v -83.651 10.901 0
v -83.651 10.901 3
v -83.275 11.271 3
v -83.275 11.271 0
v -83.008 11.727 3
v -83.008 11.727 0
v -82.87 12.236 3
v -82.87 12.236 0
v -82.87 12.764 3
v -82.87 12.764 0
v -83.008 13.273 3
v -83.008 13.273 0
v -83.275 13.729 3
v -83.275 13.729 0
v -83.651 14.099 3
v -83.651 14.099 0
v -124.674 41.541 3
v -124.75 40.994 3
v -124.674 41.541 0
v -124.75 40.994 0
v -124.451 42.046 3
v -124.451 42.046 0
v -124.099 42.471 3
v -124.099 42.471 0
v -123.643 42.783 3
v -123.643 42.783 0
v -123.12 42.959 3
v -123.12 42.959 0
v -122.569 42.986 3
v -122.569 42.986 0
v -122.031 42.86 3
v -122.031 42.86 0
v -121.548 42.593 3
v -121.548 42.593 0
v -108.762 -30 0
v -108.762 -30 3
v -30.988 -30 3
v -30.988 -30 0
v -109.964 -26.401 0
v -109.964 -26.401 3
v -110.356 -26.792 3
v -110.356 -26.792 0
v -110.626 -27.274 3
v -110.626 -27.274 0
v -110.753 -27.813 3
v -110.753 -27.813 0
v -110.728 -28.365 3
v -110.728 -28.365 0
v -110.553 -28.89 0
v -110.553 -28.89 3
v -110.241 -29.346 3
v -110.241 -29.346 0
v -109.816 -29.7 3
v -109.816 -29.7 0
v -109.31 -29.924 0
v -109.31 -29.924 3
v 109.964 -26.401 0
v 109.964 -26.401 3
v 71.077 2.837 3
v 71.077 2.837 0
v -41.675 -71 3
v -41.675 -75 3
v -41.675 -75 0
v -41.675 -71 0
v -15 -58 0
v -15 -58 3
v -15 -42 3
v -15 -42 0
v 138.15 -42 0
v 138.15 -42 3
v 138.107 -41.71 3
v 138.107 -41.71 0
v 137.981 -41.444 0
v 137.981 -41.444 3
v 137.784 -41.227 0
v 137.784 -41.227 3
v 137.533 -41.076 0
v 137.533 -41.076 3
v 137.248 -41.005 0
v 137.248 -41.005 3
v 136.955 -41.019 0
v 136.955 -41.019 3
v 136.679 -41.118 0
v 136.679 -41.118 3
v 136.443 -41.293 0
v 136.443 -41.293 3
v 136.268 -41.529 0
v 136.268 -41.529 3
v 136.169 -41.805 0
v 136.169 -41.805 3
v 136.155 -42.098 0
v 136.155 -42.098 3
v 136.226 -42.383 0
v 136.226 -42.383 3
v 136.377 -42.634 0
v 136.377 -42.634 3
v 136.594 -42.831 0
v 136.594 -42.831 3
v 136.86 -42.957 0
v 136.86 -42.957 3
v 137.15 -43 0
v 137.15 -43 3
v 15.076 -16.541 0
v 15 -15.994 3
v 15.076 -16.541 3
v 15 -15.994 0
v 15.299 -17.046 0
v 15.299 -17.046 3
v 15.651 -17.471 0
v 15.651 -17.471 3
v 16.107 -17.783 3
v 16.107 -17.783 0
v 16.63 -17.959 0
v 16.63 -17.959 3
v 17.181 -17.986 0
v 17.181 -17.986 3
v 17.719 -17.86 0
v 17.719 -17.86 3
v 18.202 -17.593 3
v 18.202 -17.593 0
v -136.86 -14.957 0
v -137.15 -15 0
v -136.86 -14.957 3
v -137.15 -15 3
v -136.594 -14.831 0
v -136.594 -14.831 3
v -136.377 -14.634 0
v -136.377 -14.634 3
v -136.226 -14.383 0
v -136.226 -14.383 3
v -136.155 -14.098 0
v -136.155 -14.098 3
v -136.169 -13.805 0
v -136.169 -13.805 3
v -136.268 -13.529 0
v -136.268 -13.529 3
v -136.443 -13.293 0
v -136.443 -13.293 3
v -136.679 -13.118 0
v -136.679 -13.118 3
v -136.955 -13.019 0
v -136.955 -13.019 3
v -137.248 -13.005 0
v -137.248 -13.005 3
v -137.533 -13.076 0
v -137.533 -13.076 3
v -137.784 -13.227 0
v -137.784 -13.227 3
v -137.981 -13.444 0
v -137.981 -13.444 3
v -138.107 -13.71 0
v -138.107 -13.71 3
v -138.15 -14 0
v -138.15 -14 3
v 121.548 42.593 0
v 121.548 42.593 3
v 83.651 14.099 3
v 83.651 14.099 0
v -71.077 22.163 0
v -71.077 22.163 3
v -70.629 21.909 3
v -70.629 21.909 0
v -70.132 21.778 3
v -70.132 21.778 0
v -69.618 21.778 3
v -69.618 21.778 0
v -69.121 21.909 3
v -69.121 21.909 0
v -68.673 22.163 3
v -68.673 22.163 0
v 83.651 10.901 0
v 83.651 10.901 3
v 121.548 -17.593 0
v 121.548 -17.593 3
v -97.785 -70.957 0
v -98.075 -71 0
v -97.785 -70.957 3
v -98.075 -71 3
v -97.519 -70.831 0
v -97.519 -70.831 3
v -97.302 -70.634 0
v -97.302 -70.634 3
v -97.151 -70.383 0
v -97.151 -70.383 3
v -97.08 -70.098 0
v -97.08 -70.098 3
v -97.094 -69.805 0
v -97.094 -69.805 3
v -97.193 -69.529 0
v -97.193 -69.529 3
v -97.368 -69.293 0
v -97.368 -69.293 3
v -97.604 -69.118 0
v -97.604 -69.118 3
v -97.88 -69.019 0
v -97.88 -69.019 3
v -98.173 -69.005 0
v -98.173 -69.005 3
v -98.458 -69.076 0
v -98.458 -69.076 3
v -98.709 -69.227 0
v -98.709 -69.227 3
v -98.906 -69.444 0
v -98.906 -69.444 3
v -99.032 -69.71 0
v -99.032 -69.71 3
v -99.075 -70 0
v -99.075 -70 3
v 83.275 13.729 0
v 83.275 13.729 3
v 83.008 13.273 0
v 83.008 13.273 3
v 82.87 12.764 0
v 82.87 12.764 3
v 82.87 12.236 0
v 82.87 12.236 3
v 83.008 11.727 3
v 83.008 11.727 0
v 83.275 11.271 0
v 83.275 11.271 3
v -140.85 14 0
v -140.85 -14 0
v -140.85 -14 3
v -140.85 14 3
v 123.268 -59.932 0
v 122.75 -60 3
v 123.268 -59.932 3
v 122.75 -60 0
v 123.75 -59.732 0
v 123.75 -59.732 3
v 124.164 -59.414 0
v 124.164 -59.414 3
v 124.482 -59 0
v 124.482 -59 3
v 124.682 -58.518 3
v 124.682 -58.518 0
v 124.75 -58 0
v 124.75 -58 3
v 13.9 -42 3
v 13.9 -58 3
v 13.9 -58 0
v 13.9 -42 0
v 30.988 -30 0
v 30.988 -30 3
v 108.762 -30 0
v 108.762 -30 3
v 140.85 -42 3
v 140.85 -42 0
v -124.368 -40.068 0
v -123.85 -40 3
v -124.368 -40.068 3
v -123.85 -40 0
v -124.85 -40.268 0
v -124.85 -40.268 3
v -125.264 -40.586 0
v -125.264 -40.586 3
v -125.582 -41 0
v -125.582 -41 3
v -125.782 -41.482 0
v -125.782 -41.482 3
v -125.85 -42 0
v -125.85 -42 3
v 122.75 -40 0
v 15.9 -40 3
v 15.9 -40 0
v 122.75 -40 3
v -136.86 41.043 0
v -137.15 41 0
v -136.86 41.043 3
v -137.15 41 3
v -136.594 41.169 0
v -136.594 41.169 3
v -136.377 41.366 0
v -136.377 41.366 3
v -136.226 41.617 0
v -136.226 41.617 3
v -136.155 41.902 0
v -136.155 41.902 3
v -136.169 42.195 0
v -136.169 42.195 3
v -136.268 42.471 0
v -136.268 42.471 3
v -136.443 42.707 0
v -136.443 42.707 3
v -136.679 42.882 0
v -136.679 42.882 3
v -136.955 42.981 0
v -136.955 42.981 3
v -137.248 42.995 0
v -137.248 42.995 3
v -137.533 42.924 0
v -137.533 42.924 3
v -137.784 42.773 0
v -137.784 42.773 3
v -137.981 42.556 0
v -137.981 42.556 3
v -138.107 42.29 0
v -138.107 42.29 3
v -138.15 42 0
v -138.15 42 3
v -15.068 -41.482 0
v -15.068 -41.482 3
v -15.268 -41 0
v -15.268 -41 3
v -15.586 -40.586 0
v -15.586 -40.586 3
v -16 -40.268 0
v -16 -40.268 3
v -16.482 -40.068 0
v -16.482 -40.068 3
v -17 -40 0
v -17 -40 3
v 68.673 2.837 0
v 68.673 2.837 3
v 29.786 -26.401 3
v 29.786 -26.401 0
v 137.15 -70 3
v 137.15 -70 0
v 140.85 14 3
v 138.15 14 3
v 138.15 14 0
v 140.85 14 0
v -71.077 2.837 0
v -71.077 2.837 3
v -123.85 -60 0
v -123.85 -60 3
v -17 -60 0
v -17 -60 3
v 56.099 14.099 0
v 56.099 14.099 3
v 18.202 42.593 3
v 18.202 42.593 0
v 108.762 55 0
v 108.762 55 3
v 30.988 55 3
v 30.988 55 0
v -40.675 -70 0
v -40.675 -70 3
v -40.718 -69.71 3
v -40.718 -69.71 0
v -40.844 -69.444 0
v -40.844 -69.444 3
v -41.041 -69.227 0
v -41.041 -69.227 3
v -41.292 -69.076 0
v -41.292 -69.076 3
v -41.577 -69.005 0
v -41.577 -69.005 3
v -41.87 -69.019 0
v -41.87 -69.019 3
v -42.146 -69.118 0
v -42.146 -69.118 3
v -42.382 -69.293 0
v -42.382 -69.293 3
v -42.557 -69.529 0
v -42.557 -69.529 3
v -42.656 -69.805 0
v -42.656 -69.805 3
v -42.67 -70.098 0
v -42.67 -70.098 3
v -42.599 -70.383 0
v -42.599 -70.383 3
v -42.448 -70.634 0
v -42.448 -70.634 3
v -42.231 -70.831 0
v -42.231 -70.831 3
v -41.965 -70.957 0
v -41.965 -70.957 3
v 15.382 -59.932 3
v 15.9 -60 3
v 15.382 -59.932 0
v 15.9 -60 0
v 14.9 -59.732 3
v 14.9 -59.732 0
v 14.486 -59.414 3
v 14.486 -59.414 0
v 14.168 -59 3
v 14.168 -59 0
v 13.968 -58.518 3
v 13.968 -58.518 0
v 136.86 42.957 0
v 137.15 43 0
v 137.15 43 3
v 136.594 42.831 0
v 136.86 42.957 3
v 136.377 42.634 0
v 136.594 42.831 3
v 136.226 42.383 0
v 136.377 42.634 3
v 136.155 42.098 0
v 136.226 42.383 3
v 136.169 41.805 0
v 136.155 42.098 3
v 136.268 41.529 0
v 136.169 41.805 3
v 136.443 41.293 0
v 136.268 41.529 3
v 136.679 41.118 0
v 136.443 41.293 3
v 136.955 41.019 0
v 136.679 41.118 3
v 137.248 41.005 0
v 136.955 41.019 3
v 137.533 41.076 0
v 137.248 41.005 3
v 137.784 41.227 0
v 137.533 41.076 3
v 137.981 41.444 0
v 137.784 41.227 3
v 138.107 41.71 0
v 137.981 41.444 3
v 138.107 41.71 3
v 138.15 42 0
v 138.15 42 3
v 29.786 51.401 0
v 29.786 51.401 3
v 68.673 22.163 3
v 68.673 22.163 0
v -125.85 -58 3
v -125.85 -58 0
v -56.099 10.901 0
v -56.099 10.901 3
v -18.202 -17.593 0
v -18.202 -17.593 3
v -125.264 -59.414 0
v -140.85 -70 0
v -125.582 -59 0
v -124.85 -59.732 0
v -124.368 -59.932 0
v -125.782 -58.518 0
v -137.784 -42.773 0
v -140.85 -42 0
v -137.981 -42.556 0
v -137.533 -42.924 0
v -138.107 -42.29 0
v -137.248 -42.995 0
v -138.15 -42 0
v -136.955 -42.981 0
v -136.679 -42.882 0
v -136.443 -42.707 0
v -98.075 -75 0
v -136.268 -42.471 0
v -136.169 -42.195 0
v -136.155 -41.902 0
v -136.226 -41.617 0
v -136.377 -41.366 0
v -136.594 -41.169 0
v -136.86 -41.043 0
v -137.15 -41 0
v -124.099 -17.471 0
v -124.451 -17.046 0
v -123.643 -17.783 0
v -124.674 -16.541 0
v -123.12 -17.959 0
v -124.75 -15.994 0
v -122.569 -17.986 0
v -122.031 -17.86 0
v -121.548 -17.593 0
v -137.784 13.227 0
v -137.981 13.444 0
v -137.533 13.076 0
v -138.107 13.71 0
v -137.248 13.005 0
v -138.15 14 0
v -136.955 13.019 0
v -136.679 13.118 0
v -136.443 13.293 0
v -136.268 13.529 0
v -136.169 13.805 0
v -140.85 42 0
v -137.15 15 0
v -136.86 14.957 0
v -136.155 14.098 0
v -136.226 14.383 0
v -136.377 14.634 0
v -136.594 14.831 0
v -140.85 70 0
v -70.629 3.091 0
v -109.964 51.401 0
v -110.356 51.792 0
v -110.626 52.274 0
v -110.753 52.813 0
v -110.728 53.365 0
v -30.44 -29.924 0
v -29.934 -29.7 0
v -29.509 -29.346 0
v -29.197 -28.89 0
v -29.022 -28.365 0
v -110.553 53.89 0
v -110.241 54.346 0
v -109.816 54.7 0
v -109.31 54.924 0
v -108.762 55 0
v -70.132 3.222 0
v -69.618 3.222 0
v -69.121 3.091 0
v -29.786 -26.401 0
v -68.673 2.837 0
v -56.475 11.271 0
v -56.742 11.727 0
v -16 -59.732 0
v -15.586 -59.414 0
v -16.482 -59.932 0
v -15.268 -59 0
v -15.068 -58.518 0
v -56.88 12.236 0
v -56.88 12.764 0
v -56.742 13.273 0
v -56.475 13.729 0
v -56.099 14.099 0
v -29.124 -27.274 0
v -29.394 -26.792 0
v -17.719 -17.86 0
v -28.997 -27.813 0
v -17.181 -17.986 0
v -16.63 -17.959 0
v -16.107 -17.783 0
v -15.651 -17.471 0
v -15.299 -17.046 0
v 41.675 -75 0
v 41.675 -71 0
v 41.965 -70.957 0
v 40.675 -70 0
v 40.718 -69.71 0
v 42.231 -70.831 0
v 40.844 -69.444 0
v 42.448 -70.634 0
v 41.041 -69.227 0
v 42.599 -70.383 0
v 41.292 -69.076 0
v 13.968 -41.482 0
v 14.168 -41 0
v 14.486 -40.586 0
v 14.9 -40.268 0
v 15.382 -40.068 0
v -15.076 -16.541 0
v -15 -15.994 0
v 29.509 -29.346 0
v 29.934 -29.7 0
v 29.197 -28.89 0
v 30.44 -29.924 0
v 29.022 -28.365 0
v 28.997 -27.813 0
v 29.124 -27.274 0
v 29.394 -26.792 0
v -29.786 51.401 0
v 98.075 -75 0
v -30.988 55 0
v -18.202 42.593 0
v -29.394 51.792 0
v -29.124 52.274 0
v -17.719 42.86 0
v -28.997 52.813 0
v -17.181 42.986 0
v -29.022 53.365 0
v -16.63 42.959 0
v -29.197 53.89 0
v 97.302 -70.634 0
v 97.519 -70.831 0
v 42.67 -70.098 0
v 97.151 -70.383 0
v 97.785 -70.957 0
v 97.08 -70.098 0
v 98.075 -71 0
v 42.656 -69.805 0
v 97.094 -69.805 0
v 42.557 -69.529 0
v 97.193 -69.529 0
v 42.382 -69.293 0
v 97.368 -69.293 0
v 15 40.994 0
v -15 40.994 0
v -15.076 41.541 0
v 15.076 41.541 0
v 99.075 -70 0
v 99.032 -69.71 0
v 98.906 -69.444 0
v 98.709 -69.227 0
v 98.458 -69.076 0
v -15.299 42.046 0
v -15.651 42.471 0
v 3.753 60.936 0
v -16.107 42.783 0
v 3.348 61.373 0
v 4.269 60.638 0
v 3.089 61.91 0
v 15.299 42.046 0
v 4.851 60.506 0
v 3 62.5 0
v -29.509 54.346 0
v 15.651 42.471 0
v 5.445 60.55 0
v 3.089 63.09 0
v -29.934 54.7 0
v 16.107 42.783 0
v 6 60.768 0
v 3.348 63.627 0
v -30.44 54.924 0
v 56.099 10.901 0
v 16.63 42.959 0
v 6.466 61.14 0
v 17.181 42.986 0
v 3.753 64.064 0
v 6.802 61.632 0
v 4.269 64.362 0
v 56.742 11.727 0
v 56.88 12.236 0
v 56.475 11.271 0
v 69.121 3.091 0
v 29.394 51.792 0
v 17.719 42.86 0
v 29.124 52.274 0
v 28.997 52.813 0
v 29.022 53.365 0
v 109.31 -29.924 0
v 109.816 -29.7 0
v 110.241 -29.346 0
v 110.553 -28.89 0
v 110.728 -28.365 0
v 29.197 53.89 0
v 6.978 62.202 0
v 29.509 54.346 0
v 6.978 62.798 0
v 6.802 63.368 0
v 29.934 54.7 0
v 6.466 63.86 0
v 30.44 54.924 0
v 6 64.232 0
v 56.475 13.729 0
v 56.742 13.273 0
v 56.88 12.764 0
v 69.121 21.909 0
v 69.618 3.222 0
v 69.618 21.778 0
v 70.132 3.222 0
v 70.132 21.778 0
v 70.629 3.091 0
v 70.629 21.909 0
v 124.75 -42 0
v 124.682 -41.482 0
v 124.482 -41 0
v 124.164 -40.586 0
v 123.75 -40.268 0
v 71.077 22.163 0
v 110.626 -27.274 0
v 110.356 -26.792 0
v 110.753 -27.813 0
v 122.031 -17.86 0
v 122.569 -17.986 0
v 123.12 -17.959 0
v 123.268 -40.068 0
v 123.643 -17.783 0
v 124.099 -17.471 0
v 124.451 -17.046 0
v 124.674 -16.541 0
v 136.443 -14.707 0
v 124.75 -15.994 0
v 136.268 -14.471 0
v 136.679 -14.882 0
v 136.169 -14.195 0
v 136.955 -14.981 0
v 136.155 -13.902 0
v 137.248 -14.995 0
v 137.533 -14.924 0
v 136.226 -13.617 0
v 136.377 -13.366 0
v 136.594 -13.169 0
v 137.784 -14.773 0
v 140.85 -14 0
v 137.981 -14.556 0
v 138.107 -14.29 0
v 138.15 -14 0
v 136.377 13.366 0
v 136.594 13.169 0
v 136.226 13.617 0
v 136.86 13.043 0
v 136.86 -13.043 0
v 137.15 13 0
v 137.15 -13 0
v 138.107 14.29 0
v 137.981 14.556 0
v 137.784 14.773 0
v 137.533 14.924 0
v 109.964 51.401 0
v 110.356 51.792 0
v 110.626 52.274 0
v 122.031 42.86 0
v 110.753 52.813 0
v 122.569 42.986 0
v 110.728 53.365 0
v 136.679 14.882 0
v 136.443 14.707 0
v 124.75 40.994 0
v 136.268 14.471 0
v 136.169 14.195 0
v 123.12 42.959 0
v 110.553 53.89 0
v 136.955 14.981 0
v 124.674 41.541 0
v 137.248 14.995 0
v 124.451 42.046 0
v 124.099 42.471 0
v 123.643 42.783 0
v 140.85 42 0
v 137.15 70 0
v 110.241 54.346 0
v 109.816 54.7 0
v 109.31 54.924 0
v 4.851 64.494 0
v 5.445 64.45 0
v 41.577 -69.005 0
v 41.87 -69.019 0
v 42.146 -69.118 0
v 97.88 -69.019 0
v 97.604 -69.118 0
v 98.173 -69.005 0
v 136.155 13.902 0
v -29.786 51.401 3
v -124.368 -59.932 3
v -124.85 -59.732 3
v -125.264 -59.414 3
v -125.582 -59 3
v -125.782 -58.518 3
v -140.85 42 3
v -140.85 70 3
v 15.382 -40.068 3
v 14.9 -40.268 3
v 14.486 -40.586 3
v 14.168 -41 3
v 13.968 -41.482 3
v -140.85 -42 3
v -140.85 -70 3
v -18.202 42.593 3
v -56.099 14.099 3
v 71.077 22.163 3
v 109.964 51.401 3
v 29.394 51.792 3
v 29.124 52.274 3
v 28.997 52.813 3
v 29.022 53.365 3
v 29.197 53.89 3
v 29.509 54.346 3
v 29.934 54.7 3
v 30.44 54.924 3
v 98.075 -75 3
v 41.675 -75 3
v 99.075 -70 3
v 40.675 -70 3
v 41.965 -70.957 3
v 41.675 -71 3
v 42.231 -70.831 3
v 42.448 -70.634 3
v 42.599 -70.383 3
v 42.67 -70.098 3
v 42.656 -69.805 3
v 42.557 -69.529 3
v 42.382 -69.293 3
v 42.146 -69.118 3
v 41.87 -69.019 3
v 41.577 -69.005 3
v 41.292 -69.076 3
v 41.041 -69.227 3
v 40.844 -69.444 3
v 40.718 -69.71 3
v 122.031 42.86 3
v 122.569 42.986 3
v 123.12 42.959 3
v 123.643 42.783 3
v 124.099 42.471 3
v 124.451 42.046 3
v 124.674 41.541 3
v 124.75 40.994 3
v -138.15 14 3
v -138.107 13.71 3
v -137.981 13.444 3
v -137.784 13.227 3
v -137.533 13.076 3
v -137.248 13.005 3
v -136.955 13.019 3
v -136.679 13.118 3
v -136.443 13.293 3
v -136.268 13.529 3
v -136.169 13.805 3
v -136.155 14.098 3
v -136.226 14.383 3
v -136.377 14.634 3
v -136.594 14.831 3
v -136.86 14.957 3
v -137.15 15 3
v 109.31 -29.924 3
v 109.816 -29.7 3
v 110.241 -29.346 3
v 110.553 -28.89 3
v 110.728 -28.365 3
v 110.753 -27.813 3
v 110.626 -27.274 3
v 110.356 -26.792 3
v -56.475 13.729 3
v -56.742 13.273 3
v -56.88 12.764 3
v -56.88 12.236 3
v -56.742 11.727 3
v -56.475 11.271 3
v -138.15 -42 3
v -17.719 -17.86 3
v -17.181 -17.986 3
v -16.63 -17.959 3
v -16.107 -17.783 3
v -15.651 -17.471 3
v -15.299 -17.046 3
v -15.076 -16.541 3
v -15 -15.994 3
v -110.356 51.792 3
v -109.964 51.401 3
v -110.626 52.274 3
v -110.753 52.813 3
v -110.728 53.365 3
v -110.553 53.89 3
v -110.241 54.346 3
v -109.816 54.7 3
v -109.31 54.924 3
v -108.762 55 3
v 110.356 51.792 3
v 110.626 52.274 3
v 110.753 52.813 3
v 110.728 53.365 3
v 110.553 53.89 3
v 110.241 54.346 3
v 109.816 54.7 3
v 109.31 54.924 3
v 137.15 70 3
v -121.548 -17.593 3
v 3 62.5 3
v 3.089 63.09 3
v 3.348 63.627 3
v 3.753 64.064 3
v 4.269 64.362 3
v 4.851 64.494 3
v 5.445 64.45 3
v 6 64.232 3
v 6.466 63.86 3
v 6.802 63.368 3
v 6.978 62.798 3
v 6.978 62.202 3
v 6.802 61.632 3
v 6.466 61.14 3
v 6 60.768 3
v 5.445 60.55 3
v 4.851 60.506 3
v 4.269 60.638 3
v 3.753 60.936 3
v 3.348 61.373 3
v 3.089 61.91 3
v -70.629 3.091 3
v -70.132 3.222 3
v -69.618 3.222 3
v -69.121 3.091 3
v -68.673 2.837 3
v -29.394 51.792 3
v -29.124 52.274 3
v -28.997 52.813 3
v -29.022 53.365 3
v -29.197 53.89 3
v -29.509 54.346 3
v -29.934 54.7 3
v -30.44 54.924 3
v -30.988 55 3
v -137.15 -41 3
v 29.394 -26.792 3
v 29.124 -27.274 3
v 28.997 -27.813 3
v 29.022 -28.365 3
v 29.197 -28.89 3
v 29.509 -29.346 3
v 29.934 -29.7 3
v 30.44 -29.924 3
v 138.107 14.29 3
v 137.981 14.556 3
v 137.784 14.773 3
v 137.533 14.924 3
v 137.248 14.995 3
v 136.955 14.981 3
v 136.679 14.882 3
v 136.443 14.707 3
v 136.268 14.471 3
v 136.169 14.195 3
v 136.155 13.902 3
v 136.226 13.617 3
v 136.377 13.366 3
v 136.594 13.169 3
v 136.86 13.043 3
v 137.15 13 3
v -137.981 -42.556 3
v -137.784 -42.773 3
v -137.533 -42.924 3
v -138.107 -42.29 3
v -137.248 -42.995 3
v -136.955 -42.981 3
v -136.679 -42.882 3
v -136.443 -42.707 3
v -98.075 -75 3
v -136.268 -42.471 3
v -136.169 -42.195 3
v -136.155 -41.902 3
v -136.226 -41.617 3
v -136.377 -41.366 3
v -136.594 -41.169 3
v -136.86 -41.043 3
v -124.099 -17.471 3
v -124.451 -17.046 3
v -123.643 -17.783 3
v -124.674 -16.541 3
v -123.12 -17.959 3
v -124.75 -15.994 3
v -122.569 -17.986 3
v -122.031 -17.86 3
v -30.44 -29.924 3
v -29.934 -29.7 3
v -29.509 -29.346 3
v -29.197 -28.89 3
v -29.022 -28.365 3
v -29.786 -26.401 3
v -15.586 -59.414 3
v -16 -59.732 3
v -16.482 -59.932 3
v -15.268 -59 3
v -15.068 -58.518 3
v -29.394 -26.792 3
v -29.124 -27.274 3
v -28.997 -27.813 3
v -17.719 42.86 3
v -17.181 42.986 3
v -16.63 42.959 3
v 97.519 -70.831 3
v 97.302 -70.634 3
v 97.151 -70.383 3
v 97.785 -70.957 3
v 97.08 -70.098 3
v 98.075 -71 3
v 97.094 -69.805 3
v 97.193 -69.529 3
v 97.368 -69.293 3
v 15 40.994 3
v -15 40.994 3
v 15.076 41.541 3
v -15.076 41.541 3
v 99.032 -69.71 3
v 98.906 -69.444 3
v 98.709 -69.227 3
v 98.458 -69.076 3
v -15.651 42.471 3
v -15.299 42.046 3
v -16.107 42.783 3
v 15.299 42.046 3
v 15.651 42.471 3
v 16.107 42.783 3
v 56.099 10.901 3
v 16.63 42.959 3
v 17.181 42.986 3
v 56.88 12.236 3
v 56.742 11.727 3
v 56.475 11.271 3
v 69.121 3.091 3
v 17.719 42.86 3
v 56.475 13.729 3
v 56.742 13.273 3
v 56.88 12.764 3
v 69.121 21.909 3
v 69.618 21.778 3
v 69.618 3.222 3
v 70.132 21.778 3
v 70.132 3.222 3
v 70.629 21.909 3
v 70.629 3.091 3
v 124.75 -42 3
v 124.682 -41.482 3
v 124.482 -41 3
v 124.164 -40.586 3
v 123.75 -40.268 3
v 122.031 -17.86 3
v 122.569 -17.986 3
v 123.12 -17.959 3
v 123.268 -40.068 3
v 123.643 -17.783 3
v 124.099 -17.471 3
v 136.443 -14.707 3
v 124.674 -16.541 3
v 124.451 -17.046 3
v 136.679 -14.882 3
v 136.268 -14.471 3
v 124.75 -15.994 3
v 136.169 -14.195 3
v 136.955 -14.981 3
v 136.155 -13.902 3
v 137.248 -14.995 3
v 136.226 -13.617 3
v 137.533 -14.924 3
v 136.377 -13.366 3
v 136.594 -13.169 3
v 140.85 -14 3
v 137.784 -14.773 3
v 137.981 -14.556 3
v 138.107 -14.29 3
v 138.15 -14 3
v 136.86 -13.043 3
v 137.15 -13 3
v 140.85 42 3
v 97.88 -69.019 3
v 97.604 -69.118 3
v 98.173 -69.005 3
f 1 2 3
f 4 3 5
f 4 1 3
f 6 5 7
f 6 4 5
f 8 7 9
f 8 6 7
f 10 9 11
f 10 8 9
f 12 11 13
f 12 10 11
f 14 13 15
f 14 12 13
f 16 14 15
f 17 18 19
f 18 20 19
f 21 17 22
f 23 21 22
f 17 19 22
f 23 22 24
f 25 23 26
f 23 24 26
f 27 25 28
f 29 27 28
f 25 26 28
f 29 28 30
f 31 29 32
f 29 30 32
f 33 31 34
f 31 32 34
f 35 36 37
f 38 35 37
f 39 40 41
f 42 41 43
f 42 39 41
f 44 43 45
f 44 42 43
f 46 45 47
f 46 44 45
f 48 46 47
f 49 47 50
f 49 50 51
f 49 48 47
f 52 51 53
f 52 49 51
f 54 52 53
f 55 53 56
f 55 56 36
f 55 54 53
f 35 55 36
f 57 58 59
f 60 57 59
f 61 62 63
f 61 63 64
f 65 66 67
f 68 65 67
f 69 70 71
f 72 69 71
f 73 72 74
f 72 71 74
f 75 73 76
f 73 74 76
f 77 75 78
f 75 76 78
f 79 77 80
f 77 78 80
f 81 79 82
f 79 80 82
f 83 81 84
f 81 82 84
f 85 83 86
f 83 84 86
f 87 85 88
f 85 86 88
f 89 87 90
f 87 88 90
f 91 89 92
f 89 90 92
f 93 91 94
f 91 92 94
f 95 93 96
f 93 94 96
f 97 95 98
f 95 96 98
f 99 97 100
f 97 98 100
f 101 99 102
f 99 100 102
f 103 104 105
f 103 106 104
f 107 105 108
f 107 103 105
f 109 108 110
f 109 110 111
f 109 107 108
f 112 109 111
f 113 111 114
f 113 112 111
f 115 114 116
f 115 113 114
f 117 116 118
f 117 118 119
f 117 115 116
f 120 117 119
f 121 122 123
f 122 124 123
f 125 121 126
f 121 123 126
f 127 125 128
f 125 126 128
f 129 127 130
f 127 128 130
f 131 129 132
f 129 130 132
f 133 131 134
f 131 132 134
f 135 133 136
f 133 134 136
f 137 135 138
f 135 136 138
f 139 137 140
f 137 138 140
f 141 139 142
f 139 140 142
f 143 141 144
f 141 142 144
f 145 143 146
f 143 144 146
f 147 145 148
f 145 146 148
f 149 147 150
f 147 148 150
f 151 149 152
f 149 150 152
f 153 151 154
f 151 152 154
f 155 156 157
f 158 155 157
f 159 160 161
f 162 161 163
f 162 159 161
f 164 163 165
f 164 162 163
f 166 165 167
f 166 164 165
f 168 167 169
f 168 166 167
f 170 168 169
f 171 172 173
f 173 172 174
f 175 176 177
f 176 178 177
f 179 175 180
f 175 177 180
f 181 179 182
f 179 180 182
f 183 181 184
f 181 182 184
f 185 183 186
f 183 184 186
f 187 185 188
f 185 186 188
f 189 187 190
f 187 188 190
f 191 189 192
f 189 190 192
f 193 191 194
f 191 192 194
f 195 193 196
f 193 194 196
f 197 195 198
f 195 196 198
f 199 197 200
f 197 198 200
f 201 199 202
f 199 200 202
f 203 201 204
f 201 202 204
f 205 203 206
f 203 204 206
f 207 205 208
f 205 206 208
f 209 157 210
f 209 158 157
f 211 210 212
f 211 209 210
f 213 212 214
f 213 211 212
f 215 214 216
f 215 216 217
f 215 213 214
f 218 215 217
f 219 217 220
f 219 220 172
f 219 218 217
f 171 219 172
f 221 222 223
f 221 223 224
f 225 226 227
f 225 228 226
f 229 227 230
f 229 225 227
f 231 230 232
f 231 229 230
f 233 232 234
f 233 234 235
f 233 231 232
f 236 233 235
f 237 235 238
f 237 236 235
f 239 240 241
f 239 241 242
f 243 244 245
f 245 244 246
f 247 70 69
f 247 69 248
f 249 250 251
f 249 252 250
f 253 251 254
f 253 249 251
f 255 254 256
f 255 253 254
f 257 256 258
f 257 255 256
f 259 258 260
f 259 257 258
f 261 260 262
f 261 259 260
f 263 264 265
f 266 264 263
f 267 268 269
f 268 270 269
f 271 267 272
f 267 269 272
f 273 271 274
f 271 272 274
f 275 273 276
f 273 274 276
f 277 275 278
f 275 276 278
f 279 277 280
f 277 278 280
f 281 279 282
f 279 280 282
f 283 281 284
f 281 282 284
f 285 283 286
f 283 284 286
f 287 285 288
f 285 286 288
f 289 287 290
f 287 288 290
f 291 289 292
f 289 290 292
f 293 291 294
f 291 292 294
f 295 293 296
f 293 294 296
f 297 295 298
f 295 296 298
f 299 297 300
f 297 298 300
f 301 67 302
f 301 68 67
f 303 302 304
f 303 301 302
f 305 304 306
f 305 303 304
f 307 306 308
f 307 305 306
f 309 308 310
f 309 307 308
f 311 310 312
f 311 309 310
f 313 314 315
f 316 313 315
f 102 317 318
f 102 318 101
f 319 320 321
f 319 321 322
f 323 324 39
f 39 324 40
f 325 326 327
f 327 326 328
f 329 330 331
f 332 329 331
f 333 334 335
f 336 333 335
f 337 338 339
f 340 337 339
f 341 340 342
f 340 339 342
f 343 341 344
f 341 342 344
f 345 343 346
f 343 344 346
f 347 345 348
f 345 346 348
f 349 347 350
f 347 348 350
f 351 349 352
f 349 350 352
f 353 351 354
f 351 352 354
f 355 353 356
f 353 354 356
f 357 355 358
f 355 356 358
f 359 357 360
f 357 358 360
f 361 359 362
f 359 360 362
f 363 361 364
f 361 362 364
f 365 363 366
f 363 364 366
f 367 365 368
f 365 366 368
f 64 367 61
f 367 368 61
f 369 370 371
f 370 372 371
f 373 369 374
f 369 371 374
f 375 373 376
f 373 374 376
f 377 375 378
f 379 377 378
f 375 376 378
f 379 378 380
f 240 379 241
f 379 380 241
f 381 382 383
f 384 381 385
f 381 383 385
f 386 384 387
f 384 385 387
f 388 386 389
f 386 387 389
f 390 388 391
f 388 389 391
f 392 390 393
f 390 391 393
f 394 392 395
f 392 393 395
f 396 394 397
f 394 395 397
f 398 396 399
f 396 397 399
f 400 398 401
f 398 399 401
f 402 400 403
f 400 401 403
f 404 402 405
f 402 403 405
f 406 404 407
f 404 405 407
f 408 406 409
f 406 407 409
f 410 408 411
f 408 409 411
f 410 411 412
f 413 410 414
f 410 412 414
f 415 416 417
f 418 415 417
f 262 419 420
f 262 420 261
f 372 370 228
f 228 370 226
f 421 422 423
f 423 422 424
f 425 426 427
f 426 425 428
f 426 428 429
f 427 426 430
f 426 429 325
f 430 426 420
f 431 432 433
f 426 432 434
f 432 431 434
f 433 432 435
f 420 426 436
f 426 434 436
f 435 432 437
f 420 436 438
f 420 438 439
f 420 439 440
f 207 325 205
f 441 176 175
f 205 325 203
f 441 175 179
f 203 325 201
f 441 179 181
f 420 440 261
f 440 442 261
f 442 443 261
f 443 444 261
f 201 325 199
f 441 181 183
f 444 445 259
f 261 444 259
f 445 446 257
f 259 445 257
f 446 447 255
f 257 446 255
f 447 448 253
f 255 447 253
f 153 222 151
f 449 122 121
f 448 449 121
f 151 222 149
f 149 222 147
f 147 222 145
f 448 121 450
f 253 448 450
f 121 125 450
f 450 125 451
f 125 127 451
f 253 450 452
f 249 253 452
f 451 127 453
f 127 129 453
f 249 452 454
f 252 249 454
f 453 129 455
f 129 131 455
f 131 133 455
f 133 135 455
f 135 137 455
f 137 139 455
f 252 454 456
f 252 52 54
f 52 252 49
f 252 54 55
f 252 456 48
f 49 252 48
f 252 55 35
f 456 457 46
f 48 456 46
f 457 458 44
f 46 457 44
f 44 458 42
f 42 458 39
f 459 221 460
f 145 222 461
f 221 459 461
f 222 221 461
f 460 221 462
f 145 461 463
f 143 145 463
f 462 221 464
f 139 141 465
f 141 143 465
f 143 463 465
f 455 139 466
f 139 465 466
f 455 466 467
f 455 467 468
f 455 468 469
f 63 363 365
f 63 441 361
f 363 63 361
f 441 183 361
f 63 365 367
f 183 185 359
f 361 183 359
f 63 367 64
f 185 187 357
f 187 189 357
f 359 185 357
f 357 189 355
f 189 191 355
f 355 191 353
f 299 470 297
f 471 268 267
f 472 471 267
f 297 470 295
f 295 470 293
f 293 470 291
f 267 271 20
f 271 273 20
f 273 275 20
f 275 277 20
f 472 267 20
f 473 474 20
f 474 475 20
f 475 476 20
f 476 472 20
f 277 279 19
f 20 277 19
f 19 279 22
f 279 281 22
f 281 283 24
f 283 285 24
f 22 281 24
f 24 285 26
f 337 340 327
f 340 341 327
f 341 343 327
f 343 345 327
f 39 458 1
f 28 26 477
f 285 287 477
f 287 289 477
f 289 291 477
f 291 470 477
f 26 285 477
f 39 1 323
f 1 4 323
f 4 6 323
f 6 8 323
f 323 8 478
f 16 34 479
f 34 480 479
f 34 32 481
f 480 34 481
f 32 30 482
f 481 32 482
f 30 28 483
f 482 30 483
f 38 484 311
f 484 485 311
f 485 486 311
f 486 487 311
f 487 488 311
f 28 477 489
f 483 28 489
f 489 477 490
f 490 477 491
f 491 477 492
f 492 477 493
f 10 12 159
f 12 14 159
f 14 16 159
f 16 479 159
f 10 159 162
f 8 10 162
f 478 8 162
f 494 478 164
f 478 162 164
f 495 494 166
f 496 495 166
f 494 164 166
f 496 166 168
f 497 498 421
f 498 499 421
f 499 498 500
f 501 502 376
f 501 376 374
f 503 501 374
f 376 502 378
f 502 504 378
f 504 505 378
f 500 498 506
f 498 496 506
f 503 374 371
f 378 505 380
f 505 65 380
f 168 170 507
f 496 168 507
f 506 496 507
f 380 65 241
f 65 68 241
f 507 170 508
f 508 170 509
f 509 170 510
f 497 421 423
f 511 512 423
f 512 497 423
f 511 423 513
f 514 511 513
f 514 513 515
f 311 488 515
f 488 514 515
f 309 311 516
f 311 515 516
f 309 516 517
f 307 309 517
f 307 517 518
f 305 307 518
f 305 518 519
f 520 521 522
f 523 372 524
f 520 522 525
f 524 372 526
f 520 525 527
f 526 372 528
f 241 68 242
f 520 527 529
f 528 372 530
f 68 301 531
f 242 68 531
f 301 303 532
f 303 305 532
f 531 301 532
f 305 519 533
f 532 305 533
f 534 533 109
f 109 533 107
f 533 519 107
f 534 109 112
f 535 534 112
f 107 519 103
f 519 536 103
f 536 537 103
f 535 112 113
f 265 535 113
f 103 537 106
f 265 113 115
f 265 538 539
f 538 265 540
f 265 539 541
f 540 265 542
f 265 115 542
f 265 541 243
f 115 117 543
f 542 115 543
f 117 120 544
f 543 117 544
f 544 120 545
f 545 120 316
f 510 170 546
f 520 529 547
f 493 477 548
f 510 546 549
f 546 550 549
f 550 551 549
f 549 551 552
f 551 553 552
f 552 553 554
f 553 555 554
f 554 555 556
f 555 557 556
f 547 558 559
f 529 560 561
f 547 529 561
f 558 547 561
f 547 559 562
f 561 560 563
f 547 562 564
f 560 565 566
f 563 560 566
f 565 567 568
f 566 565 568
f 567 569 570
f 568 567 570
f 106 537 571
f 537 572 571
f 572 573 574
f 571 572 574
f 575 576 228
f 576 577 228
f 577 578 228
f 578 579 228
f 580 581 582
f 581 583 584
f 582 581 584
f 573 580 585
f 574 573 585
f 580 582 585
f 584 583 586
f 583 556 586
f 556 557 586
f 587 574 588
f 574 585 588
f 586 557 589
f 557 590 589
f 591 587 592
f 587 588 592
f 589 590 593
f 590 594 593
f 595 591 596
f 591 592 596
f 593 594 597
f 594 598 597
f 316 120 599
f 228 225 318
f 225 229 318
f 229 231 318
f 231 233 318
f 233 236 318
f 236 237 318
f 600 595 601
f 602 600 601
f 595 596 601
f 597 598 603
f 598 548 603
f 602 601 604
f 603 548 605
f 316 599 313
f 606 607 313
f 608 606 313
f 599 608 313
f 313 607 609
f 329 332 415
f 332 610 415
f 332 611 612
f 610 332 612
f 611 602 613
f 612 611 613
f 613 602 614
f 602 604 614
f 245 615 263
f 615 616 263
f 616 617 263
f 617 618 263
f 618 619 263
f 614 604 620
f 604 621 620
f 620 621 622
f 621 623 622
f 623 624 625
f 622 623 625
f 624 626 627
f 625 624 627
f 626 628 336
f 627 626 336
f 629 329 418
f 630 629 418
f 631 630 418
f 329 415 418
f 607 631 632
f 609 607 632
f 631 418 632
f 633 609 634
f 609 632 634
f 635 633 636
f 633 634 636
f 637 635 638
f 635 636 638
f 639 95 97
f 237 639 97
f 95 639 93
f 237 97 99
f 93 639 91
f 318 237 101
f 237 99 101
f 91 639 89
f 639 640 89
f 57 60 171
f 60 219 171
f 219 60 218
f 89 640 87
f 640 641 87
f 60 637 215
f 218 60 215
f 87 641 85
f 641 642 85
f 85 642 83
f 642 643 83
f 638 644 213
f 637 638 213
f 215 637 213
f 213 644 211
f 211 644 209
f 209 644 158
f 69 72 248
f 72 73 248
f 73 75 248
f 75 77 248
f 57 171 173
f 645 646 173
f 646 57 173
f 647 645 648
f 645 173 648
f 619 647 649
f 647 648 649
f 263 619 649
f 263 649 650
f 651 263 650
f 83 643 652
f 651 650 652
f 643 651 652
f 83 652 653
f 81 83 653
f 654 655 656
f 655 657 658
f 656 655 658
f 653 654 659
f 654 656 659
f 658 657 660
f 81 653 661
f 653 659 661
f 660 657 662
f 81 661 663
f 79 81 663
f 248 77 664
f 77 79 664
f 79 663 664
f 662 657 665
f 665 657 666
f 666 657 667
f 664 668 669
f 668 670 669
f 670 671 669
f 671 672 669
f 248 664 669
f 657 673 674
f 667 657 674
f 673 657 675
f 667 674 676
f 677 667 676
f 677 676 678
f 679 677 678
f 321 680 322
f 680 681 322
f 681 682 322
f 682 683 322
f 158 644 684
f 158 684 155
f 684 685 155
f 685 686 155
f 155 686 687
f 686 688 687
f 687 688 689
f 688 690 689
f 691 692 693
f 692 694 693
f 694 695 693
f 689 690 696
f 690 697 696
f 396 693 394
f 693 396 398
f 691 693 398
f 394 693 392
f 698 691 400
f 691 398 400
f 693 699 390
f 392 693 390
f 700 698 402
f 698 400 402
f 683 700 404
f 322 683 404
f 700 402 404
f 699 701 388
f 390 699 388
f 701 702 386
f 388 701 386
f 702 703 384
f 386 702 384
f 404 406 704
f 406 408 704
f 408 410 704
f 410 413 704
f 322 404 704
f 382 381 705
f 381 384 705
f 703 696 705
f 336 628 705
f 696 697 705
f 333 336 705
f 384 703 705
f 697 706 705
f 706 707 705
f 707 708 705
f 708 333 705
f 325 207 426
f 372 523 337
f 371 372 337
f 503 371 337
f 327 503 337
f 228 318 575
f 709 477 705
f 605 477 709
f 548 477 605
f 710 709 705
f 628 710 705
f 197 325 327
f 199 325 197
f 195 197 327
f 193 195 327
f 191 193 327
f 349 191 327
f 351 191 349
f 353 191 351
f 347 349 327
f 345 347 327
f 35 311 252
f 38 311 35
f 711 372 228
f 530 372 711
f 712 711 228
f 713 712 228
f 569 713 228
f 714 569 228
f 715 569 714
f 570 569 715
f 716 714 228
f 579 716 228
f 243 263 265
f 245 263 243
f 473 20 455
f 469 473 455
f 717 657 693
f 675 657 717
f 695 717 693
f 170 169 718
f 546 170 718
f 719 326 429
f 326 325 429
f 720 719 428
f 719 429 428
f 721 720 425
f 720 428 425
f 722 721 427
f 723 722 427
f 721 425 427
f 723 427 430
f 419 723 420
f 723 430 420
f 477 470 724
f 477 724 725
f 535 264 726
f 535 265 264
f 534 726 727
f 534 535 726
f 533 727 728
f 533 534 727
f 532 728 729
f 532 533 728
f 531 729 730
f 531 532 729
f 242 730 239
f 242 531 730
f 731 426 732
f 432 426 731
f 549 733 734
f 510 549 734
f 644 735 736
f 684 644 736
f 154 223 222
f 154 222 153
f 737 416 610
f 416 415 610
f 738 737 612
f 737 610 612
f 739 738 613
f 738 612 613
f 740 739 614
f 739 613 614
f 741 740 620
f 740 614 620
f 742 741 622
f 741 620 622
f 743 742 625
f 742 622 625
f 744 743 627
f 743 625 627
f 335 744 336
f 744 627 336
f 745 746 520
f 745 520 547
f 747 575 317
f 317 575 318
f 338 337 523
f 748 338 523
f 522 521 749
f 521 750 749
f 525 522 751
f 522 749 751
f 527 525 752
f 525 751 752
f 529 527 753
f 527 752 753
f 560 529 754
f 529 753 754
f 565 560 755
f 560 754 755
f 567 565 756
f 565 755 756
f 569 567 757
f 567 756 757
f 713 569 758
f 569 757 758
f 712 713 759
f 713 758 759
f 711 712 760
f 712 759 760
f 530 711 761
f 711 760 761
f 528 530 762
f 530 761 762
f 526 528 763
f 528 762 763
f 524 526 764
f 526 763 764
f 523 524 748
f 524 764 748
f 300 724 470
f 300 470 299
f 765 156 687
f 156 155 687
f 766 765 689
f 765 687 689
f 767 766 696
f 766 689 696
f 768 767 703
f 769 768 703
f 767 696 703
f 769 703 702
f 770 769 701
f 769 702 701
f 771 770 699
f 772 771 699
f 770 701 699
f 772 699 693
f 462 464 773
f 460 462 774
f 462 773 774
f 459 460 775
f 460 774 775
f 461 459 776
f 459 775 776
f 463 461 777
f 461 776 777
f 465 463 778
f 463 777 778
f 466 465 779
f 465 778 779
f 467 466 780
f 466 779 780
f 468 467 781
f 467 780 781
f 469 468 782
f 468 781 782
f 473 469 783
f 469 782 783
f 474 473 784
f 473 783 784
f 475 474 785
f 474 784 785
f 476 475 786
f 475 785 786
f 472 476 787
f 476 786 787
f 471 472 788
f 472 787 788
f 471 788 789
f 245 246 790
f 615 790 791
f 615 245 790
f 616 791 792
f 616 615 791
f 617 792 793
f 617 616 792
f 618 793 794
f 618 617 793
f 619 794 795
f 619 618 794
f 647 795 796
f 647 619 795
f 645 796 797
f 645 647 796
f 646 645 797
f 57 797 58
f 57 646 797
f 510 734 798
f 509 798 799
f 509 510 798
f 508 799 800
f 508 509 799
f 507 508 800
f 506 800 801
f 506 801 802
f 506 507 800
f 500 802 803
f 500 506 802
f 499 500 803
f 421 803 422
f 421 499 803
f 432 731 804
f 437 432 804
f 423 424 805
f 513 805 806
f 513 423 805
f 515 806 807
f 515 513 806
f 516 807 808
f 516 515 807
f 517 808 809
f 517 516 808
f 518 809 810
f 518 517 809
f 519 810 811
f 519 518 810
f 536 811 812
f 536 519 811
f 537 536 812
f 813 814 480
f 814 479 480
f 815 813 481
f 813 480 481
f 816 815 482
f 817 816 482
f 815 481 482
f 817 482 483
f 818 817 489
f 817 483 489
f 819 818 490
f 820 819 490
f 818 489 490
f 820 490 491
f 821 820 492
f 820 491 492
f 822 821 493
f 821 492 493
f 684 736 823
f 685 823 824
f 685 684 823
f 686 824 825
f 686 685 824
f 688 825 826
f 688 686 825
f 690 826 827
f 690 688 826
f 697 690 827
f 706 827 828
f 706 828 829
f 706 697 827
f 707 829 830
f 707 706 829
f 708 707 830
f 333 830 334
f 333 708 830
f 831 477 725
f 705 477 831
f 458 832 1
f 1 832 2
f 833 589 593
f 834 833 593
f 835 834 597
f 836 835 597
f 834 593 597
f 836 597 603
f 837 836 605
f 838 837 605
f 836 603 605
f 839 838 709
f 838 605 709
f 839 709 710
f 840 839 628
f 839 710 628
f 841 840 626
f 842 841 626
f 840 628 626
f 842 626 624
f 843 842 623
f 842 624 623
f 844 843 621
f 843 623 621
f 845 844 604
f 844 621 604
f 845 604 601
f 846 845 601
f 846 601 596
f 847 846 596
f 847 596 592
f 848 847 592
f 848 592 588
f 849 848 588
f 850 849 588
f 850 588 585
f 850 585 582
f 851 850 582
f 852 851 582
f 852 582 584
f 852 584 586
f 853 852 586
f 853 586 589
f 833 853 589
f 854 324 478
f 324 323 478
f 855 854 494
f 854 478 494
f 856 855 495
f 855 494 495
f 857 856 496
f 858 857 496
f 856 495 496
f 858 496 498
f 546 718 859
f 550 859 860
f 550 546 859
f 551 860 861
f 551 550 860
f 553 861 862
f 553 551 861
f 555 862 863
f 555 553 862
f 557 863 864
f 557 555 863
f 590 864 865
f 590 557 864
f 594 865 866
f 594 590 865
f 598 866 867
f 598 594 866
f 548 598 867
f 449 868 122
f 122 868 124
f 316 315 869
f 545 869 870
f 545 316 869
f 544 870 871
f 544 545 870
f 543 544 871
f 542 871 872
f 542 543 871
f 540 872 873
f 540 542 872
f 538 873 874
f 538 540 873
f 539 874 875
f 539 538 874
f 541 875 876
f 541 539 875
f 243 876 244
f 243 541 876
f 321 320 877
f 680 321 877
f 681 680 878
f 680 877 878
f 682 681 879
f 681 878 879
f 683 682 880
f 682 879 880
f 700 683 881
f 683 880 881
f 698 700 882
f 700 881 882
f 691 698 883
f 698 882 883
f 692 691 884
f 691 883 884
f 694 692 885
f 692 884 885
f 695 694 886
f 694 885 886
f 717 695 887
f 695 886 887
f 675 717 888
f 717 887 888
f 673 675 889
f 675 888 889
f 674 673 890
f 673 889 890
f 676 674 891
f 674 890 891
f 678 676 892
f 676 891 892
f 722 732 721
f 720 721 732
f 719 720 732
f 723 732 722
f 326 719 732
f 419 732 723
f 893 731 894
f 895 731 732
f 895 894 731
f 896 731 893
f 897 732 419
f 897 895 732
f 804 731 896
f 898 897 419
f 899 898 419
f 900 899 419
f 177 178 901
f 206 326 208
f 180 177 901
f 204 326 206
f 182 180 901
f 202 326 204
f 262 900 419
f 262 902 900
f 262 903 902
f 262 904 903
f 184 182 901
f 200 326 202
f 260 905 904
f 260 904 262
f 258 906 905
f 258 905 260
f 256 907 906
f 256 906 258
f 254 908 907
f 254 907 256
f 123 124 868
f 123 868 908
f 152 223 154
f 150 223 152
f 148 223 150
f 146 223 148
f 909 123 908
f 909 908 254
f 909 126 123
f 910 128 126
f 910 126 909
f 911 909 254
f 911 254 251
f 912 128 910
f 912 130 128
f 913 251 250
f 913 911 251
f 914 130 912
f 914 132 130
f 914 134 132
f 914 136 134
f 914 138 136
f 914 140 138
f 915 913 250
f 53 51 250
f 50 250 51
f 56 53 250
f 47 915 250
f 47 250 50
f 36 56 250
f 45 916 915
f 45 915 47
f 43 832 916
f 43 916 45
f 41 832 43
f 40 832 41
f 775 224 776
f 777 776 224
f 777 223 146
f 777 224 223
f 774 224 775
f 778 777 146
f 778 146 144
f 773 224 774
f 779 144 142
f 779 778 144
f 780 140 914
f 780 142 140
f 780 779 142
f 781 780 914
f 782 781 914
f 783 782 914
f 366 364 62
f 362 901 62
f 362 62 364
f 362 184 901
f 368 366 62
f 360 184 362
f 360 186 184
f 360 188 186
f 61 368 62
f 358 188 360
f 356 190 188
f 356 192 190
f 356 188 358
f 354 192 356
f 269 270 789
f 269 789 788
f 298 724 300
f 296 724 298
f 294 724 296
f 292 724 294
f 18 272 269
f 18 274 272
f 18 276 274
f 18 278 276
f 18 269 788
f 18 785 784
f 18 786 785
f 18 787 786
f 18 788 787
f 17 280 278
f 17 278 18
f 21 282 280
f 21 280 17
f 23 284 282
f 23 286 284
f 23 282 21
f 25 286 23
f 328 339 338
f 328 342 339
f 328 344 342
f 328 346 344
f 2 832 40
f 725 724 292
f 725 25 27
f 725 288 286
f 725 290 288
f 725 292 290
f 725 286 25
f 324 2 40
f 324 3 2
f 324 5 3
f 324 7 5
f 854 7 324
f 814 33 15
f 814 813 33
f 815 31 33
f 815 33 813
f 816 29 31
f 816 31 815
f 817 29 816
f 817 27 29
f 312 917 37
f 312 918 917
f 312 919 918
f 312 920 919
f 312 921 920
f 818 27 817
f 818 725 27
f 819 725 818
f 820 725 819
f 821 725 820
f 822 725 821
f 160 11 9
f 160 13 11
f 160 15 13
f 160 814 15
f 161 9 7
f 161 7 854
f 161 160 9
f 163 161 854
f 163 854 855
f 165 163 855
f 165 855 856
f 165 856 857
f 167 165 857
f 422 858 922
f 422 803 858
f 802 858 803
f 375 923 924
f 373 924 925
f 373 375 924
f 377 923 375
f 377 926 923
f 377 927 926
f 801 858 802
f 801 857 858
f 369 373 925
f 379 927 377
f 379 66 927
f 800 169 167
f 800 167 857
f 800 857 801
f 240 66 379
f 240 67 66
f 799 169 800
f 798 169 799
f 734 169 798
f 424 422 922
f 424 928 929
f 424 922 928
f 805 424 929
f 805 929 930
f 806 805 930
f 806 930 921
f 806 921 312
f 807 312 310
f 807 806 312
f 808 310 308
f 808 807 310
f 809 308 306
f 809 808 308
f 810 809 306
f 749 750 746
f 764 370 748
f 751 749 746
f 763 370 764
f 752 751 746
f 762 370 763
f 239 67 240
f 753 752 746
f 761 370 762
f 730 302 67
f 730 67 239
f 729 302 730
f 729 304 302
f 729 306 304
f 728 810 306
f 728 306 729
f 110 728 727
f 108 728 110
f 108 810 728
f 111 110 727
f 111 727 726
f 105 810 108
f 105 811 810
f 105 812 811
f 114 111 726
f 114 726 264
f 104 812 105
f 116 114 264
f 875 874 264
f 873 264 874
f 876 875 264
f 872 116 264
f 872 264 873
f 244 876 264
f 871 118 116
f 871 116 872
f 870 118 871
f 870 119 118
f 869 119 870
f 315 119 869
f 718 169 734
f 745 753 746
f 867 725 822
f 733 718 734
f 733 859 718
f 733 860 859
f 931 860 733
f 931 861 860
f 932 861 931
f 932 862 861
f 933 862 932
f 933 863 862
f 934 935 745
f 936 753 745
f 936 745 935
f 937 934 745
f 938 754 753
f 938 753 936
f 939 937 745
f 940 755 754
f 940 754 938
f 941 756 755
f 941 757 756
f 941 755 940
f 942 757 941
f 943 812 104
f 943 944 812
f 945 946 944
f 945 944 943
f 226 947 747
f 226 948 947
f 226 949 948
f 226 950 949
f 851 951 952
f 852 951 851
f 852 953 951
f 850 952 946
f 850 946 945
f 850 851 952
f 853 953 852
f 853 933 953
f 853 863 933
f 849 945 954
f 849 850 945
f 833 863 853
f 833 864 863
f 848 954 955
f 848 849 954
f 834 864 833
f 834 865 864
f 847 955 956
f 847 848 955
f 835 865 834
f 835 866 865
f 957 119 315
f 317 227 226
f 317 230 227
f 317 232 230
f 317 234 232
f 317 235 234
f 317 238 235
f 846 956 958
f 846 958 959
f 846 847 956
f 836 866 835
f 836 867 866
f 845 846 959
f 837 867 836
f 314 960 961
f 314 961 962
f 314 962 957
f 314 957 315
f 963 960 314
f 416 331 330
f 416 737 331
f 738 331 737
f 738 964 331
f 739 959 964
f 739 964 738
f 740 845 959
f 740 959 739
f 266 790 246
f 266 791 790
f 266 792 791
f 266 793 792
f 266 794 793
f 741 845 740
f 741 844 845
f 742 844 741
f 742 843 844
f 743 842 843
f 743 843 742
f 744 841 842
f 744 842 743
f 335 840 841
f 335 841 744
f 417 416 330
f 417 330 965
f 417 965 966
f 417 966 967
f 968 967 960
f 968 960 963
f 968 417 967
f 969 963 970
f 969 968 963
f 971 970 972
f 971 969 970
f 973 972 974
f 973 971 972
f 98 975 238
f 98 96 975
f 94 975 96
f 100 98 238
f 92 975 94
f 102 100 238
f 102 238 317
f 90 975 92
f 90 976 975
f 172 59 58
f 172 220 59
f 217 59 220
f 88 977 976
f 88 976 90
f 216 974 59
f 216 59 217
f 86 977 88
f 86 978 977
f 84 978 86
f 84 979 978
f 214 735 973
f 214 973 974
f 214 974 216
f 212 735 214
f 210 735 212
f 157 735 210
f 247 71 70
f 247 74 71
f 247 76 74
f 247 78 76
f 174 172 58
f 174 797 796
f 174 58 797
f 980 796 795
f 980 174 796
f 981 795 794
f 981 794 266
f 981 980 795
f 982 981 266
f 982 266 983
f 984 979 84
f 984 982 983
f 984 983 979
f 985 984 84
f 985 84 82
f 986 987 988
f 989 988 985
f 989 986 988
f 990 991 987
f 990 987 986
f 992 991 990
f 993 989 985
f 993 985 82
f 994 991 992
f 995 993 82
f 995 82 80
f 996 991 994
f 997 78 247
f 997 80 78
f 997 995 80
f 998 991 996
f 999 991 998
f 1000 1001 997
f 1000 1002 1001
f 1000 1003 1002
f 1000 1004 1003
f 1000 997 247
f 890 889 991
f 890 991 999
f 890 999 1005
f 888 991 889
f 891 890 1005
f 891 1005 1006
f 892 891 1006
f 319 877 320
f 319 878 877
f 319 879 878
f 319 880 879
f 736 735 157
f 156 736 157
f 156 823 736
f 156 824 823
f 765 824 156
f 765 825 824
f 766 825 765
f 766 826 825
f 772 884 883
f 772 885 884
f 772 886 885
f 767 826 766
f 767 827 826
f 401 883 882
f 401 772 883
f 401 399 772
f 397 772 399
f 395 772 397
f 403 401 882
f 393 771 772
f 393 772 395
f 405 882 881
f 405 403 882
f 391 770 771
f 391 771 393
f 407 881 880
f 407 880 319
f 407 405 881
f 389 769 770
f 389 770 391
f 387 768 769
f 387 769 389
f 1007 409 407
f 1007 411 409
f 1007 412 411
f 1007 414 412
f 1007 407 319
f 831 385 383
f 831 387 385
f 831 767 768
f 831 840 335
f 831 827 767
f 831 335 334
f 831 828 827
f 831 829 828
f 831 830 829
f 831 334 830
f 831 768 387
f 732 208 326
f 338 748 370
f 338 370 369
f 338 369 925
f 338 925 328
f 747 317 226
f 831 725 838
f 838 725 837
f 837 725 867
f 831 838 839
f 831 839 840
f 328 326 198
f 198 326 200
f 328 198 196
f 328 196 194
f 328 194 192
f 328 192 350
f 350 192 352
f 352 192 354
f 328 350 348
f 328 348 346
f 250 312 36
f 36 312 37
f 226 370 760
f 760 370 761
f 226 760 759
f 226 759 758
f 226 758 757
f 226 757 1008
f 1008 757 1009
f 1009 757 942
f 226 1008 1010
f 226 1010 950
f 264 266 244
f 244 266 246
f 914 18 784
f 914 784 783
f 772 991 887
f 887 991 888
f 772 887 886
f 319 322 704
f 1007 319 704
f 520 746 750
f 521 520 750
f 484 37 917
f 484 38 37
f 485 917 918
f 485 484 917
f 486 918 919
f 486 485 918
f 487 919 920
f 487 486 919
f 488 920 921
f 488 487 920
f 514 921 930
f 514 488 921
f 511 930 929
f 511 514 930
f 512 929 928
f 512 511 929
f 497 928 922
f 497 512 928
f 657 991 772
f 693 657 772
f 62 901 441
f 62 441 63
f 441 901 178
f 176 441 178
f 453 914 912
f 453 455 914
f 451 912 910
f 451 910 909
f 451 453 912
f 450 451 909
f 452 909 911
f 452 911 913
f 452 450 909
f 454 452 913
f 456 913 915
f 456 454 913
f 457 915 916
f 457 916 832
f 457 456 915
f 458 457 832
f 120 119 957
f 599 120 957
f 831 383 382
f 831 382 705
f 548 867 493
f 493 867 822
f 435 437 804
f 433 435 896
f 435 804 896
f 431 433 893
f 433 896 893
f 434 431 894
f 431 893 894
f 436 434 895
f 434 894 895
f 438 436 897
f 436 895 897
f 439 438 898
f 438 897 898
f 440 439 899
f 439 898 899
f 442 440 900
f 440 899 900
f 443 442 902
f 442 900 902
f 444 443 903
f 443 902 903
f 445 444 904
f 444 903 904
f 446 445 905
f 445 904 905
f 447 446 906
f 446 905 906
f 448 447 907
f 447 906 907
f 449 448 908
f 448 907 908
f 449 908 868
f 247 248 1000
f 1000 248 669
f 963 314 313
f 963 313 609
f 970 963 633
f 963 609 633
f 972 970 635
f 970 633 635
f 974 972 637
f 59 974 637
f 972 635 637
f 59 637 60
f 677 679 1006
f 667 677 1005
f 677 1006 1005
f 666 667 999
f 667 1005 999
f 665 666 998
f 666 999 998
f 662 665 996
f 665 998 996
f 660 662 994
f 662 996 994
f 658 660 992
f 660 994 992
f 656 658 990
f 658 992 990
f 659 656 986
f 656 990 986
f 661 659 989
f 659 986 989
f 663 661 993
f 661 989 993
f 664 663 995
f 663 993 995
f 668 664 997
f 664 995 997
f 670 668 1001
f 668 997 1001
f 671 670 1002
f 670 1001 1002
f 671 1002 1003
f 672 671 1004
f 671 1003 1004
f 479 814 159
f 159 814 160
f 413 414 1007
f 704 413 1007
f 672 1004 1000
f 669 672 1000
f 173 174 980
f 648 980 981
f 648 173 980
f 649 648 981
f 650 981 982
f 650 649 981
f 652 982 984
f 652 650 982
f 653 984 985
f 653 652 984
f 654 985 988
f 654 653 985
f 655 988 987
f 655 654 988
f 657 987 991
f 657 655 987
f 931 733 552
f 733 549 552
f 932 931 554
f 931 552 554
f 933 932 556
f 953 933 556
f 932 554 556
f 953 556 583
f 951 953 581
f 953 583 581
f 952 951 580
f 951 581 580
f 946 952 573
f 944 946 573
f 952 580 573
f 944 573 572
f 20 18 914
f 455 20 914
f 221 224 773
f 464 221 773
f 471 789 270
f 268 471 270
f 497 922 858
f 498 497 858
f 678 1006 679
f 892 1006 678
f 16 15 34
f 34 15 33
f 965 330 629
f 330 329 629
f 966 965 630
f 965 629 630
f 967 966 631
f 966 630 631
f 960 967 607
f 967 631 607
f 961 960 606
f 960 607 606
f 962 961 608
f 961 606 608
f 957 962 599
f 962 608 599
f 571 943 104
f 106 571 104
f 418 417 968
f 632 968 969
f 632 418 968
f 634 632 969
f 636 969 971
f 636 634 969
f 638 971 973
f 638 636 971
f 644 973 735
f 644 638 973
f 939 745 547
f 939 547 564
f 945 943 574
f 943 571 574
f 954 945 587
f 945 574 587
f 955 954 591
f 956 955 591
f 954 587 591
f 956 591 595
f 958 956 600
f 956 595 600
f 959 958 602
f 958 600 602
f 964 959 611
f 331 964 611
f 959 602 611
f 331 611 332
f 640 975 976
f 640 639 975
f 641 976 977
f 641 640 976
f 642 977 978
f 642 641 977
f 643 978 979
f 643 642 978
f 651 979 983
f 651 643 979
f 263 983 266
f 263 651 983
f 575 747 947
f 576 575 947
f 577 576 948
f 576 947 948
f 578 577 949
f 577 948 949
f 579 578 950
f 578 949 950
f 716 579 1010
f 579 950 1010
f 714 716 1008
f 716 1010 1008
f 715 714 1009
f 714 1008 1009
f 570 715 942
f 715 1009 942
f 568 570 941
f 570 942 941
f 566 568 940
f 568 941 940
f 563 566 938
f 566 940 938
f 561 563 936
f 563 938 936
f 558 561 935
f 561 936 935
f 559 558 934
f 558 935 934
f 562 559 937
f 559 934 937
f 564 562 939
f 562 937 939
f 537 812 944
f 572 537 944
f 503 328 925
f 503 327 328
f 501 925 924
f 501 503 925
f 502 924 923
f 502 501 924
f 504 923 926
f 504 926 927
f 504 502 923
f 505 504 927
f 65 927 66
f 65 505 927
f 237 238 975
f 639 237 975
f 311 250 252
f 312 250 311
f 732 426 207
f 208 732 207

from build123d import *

# Parameters (mm, degrees)
SKETCH1_W           = 281.7
SKETCH1_H           = 140
BOSS_EXTRUDE1_DEPTH = 3
SKETCH2_W           = 110.85
SKETCH2_H           = 20
CUT_EXTRUDE1_DEPTH  = 158.314088689
FILLET1_R           = 2
SKETCH3_W           = 3.7
SKETCH3_H           = 28
CUT_EXTRUDE2_DEPTH  = 158.314088689
SKETCH4_W           = 56.4
SKETCH4_H           = 5
BOSS_EXTRUDE2_DEPTH = 3
FILLET2_R           = 2
SKETCH5_R           = 2
CUT_EXTRUDE3_DEPTH  = 160.601762208
SKETCH6_R           = 1
CUT_EXTRUDE4_DEPTH  = 160.601762208


with BuildPart() as part:
    # Sketch1 → Boss-Extrude1 (new body)
    with BuildSketch(Plane.XY):
        Rectangle(SKETCH1_W, SKETCH1_H)
    extrude(amount=BOSS_EXTRUDE1_DEPTH)

    # Sketch2 → Cut-Extrude1 (cut, through all)
    with BuildSketch(Plane.XY.offset(3)):
        Polygon((-124.75, 45), (-124.75, -20), (-81.525, 12.5), align=None)
        Polygon((-114.75, 55), (-69.875, 21.259398496), (-25, 55), align=None)
        Polygon((-15, 45), (-58.225, 12.5), (-15, -20), align=None)
        Polygon((-69.875, 3.740601504), (-114.75, -30), (-25, -30), align=None)
        with Locations((-70.425, -50)):
            Rectangle(SKETCH2_W, SKETCH2_H)
        with Locations((69.325, -50)):
            Rectangle(SKETCH2_W, SKETCH2_H)
        Polygon((69.875, 3.740601504), (25, -30), (114.75, -30), align=None)
        Polygon((15, 45), (15, -20), (58.225, 12.5), align=None)
        Polygon((25, 55), (69.875, 21.259398496), (114.75, 55), align=None)
        Polygon((124.75, 45), (81.525, 12.5), (124.75, -20), align=None)
    extrude(amount=-CUT_EXTRUDE1_DEPTH, mode=Mode.SUBTRACT)

    # Fillet1
    fillet1_edges = [part.edges().sort_by_distance(p)[0] for p in [
        (114.75, 55, 1.5),
        (25, 55, 1.5),
        (124.75, 45, 1.5),
        (124.75, -20, 1.5),
        (81.525, 12.5, 1.5),
        (-81.525, 12.5, 1.5),
        (-124.75, -20, 1.5),
        (-124.75, 45, 1.5),
        (-25, 55, 1.5),
        (-69.875, 21.259398496, 1.5),
        (-114.75, 55, 1.5),
        (-15, 45, 1.5),
        (-15, -20, 1.5),
        (-58.225, 12.5, 1.5),
        (-69.875, 3.740601504, 1.5),
        (-25, -30, 1.5),
        (-114.75, -30, 1.5),
        (-15, -60, 1.5),
        (-125.85, -60, 1.5),
        (-125.85, -40, 1.5),
        (-15, -40, 1.5),
        (124.75, -60, 1.5),
        (13.9, -60, 1.5),
        (13.9, -40, 1.5),
        (124.75, -40, 1.5),
        (69.875, 3.740601504, 1.5),
        (114.75, -30, 1.5),
        (25, -30, 1.5),
        (15, -20, 1.5),
        (15, 45, 1.5),
    ]]
    fillet(fillet1_edges, radius=FILLET1_R)

    # Sketch3 → Cut-Extrude2 (cut, through all)
    with BuildSketch(Plane.XY.offset(3)):
        with Locations((139, 56)):
            Rectangle(SKETCH3_W, SKETCH3_H)
        with Locations((139, -56)):
            Rectangle(SKETCH3_W, SKETCH3_H)
        with Locations((139, 0)):
            Rectangle(SKETCH3_W, SKETCH3_H)
        with Locations((-139, -28)):
            Rectangle(SKETCH3_W, SKETCH3_H)
        with Locations((-139, 28)):
            Rectangle(SKETCH3_W, SKETCH3_H)
    extrude(amount=-CUT_EXTRUDE2_DEPTH, mode=Mode.SUBTRACT)

    # Sketch4 → Boss-Extrude2 (add)
    with BuildSketch(Plane.XY.offset(3)):
        with Locations((-69.875, -72.5)):
            Rectangle(SKETCH4_W, SKETCH4_H)
        with Locations((69.875, -72.5)):
            Rectangle(SKETCH4_W, SKETCH4_H)
    extrude(amount=-BOSS_EXTRUDE2_DEPTH)

    # Fillet2
    fillet2_edges = [part.edges().sort_by_distance(p)[0] for p in [
        (69.875, 21.259398496, 1.5),
        (58.225, 12.5, 1.5),
    ]]
    fillet(fillet2_edges, radius=FILLET2_R)

    # Sketch5 → Cut-Extrude3 (cut, through all)
    with BuildSketch(Plane(origin=(0, 0, 0), x_dir=(-1, 0, 0), z_dir=(0, 0, -1))):
        with Locations((-5, 62.5)):
            Circle(SKETCH5_R)
    extrude(amount=-CUT_EXTRUDE3_DEPTH, mode=Mode.SUBTRACT)

    # Sketch6 → Cut-Extrude4 (cut, through all)
    with BuildSketch(Plane.XY.offset(3)):
        with Locations((-137.15, 42)):
            Circle(SKETCH6_R)
        with Locations((-137.15, 14)):
            Circle(SKETCH6_R)
        with Locations((-137.15, -14)):
            Circle(SKETCH6_R)
        with Locations((-137.15, -42)):
            Circle(SKETCH6_R)
        with Locations((-98.075, -70)):
            Circle(SKETCH6_R)
        with Locations((-41.675, -70)):
            Circle(SKETCH6_R)
        with Locations((41.675, -70)):
            Circle(SKETCH6_R)
        with Locations((98.075, -70)):
            Circle(SKETCH6_R)
        with Locations((137.15, -42)):
            Circle(SKETCH6_R)
        with Locations((137.15, -14)):
            Circle(SKETCH6_R)
        with Locations((137.15, 14)):
            Circle(SKETCH6_R)
        with Locations((137.15, 42)):
            Circle(SKETCH6_R)
    extrude(amount=-CUT_EXTRUDE4_DEPTH, mode=Mode.SUBTRACT)


solid = part.part
